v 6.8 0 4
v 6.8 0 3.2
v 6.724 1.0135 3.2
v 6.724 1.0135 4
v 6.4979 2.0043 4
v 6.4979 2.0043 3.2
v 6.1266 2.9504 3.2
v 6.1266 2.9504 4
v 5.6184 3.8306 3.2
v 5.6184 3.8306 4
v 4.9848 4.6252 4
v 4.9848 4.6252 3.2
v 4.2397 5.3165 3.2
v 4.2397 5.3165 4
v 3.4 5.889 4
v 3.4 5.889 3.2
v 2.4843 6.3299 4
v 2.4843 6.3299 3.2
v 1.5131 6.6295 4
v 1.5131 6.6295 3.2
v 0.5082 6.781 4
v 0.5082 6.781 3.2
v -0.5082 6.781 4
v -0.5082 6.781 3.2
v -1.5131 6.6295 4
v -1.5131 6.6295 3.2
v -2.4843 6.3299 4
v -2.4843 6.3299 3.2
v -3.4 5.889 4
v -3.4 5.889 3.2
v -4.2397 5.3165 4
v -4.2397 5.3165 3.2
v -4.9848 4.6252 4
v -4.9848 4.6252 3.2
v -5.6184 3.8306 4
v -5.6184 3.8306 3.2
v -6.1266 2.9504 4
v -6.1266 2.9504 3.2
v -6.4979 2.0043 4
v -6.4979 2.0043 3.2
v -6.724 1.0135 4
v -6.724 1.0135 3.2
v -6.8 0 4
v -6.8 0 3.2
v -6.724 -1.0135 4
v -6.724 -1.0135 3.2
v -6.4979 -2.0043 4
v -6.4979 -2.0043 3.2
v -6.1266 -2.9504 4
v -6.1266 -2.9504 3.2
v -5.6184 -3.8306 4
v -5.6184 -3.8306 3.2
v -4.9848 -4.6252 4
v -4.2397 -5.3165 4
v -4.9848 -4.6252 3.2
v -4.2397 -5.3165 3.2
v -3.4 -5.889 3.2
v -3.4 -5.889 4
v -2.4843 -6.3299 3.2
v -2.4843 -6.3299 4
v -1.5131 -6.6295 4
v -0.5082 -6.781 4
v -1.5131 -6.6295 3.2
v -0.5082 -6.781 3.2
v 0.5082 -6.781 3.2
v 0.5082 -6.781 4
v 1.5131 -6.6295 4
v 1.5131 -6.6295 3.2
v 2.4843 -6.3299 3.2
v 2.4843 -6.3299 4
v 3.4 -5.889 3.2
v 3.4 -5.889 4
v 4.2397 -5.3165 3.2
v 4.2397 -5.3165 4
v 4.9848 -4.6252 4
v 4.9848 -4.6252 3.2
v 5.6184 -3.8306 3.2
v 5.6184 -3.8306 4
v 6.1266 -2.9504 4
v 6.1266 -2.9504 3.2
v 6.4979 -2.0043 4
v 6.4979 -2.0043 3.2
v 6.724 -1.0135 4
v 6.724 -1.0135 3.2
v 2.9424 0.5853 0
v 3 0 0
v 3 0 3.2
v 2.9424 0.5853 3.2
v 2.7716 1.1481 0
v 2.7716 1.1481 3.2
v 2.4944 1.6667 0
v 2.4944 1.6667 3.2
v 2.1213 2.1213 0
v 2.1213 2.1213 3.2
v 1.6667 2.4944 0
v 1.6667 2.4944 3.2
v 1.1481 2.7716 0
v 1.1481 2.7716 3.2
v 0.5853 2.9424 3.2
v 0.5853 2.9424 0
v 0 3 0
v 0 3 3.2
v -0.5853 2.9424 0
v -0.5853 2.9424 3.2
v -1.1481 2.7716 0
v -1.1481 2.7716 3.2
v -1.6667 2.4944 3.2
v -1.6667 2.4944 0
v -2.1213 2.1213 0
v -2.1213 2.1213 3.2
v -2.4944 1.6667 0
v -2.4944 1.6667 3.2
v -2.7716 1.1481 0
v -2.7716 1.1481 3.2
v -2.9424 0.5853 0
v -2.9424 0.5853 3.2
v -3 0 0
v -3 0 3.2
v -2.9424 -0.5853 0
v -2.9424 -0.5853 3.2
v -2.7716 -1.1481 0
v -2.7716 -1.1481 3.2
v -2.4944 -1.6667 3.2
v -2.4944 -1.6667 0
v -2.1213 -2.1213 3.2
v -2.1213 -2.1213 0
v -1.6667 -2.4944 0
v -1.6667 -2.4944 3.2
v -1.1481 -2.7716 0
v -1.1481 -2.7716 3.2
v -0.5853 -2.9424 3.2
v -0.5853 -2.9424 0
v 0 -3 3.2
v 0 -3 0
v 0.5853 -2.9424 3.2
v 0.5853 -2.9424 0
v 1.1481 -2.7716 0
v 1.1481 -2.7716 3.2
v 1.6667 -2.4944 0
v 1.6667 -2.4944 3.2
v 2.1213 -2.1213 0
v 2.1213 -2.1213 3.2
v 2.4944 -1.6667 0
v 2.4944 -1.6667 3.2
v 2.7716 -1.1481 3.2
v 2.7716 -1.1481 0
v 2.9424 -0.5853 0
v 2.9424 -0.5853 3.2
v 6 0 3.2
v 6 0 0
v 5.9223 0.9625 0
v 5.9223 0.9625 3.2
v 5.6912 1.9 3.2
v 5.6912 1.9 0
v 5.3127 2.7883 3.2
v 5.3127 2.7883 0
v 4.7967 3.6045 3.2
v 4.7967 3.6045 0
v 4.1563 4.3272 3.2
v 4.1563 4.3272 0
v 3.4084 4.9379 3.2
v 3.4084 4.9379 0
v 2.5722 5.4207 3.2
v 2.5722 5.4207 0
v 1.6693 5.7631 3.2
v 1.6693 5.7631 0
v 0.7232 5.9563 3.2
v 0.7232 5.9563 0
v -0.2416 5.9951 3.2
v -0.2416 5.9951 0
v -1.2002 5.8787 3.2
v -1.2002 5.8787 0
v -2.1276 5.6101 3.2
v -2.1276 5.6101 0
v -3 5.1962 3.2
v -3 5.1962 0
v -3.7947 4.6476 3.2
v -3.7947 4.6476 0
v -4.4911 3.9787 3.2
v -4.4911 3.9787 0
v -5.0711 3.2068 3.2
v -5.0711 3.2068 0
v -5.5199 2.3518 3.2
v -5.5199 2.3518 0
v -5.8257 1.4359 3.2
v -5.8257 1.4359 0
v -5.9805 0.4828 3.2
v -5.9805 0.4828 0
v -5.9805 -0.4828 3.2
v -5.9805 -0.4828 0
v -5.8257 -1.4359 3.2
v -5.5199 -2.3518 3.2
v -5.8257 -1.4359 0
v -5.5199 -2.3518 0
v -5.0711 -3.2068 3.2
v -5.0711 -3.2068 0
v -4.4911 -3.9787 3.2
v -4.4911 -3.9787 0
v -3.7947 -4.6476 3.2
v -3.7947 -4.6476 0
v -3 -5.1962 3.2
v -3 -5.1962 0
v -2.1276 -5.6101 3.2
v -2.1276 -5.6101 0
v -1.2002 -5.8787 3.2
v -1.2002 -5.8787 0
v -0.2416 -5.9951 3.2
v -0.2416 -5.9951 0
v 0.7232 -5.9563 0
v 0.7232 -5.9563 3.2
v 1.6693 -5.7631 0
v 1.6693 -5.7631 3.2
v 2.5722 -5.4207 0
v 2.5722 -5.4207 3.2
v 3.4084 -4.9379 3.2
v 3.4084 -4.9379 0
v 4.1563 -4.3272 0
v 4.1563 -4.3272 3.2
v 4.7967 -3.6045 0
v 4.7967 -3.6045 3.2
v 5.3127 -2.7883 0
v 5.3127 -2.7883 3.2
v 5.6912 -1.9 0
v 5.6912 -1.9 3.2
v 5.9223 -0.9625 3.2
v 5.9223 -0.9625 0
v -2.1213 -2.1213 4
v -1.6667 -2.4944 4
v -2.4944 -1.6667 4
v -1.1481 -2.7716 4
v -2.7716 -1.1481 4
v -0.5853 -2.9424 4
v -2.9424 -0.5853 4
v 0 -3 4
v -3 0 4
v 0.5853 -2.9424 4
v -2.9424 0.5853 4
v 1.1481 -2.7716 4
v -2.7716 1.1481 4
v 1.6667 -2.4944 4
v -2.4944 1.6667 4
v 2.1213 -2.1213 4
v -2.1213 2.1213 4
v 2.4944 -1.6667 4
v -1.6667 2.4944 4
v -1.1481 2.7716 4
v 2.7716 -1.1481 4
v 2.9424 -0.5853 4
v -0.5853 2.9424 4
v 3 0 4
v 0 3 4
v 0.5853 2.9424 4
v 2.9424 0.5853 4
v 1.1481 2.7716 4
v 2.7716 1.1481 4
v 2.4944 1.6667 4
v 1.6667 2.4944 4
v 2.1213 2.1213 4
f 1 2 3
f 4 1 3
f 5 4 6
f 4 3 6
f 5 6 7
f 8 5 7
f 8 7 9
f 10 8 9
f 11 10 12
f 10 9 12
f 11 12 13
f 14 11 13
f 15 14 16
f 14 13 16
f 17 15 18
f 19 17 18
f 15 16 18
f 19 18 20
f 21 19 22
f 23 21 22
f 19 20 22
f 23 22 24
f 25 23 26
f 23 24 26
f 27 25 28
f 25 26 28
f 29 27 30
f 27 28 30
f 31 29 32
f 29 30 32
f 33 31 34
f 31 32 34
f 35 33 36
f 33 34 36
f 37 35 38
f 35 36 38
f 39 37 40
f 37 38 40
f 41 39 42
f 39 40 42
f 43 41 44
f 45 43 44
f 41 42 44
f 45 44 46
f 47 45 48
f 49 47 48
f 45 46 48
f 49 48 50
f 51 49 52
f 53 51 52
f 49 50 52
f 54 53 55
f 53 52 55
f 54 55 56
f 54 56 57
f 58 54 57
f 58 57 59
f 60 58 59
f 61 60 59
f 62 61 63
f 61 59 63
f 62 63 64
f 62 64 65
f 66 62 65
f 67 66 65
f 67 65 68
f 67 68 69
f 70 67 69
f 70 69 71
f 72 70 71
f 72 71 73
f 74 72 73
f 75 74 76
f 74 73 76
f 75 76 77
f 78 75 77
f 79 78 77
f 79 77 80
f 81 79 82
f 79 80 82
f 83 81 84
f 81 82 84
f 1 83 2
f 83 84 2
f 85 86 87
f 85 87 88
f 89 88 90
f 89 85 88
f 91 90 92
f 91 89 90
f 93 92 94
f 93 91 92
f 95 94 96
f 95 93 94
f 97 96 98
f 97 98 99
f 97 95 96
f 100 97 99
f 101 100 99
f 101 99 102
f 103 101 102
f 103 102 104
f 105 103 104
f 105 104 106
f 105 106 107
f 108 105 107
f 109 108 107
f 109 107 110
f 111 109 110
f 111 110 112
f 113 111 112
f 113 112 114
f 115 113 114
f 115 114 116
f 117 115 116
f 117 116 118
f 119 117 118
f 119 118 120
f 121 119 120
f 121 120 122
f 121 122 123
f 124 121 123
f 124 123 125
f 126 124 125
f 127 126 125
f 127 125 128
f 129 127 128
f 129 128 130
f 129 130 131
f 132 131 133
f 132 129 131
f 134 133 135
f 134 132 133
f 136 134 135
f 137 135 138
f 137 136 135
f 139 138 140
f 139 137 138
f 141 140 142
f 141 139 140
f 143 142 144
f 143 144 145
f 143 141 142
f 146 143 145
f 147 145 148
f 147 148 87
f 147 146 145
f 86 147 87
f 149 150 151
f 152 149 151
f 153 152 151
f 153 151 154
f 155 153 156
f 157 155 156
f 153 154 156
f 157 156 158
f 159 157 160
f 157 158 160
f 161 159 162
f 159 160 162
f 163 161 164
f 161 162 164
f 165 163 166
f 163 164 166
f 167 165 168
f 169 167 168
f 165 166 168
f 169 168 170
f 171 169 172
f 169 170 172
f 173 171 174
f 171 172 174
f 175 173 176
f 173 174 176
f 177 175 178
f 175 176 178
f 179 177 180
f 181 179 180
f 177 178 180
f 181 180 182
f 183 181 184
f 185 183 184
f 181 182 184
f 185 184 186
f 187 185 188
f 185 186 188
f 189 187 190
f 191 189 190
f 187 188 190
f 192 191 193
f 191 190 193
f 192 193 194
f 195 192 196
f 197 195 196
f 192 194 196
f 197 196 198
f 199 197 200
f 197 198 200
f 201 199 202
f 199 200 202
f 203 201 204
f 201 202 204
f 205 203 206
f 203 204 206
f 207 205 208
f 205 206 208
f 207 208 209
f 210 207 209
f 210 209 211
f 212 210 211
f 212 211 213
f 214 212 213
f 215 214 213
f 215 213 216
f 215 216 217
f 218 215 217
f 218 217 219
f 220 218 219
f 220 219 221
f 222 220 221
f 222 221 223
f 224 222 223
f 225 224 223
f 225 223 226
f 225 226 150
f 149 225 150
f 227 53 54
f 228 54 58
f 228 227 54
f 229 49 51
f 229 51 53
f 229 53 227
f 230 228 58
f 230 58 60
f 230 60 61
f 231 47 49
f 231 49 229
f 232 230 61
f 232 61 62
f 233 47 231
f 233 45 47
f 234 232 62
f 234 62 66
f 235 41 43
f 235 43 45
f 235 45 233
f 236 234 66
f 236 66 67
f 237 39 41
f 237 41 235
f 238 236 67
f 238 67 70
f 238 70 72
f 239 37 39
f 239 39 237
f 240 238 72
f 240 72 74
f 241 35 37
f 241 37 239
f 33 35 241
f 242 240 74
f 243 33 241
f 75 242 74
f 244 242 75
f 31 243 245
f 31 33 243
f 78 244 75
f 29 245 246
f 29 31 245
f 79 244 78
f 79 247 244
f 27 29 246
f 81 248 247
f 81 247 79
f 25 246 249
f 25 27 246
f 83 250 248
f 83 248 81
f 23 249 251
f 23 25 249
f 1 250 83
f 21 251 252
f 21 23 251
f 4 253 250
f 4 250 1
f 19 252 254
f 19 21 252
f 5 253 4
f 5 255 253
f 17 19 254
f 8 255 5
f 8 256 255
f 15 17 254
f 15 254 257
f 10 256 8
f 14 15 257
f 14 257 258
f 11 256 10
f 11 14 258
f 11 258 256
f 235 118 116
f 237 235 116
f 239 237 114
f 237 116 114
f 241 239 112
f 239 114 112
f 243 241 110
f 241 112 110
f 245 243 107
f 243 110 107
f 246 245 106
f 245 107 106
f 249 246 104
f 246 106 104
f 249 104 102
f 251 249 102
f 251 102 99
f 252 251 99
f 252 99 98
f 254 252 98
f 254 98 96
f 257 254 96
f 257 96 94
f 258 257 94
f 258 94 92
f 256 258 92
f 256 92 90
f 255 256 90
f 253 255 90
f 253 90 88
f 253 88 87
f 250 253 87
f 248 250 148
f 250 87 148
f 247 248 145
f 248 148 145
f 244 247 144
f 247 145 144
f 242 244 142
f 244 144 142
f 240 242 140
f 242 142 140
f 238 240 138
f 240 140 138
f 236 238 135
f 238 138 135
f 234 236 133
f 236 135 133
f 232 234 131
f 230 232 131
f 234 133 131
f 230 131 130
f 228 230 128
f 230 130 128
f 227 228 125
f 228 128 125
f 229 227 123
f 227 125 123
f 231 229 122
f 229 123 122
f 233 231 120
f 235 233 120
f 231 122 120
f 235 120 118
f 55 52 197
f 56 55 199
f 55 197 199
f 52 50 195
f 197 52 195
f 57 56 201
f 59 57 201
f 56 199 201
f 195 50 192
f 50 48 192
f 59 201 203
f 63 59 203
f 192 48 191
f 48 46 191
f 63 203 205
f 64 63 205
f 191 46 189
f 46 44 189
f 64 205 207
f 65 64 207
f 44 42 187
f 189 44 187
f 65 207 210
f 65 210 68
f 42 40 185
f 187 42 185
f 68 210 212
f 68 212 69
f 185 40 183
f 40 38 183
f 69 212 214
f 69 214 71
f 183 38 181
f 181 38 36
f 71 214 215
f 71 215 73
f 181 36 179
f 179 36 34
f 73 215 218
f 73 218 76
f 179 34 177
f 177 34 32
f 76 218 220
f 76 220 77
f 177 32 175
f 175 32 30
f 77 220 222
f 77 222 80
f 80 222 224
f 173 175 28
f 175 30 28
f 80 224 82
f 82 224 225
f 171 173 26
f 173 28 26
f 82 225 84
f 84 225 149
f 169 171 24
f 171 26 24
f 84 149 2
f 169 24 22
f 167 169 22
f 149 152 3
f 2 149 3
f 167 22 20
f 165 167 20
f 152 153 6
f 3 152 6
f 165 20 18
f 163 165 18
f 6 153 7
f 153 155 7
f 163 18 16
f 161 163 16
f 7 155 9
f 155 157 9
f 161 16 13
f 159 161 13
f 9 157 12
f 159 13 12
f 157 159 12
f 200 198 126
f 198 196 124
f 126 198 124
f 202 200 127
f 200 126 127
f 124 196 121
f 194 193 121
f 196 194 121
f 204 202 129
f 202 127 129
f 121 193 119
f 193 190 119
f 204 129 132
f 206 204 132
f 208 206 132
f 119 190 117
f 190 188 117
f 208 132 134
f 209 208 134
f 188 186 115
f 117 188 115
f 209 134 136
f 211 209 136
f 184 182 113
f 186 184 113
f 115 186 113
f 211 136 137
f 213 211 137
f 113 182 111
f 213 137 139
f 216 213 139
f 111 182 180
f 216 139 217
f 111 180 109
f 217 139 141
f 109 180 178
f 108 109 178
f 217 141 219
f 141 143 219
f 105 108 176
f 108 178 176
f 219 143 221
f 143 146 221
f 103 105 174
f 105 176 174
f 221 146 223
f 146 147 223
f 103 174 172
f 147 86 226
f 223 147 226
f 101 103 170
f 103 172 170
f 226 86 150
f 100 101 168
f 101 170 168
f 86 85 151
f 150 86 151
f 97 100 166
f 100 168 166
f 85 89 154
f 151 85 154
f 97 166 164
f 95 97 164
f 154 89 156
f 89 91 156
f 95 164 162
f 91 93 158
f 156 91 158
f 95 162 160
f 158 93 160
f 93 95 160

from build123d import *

# Parameters (mm, degrees)
SKETCH_1_R          = 6
SKETCH_1_R_2        = 3
EXTRUDE_1_DEPTH     = 3.2
SKETCH_2_R          = 6.8
EXTRUDE_2_DEPTH     = 0.8
SKETCH_3_R          = 3
CUT_EXTRUDE_1_DEPTH = 0.8


with BuildPart() as part:
    # 草图1 → 凸台-拉伸1 (new body)
    with BuildSketch(Plane.XY):
        Circle(SKETCH_1_R)
        Circle(SKETCH_1_R_2, mode=Mode.SUBTRACT)
    extrude(amount=EXTRUDE_1_DEPTH)

    # 草图2 → 凸台-拉伸2 (add)
    with BuildSketch(Plane.XY.offset(3.2)):
        Circle(SKETCH_2_R)
    extrude(amount=EXTRUDE_2_DEPTH)

    # 草图3 → 切除-拉伸1 (cut)
    with BuildSketch(Plane(origin=(0, 0, 3.2), x_dir=(-1, 0, 0), z_dir=(0, 0, -1))):
        Circle(SKETCH_3_R)
    extrude(amount=-CUT_EXTRUDE_1_DEPTH, mode=Mode.SUBTRACT)


solid = part.part
